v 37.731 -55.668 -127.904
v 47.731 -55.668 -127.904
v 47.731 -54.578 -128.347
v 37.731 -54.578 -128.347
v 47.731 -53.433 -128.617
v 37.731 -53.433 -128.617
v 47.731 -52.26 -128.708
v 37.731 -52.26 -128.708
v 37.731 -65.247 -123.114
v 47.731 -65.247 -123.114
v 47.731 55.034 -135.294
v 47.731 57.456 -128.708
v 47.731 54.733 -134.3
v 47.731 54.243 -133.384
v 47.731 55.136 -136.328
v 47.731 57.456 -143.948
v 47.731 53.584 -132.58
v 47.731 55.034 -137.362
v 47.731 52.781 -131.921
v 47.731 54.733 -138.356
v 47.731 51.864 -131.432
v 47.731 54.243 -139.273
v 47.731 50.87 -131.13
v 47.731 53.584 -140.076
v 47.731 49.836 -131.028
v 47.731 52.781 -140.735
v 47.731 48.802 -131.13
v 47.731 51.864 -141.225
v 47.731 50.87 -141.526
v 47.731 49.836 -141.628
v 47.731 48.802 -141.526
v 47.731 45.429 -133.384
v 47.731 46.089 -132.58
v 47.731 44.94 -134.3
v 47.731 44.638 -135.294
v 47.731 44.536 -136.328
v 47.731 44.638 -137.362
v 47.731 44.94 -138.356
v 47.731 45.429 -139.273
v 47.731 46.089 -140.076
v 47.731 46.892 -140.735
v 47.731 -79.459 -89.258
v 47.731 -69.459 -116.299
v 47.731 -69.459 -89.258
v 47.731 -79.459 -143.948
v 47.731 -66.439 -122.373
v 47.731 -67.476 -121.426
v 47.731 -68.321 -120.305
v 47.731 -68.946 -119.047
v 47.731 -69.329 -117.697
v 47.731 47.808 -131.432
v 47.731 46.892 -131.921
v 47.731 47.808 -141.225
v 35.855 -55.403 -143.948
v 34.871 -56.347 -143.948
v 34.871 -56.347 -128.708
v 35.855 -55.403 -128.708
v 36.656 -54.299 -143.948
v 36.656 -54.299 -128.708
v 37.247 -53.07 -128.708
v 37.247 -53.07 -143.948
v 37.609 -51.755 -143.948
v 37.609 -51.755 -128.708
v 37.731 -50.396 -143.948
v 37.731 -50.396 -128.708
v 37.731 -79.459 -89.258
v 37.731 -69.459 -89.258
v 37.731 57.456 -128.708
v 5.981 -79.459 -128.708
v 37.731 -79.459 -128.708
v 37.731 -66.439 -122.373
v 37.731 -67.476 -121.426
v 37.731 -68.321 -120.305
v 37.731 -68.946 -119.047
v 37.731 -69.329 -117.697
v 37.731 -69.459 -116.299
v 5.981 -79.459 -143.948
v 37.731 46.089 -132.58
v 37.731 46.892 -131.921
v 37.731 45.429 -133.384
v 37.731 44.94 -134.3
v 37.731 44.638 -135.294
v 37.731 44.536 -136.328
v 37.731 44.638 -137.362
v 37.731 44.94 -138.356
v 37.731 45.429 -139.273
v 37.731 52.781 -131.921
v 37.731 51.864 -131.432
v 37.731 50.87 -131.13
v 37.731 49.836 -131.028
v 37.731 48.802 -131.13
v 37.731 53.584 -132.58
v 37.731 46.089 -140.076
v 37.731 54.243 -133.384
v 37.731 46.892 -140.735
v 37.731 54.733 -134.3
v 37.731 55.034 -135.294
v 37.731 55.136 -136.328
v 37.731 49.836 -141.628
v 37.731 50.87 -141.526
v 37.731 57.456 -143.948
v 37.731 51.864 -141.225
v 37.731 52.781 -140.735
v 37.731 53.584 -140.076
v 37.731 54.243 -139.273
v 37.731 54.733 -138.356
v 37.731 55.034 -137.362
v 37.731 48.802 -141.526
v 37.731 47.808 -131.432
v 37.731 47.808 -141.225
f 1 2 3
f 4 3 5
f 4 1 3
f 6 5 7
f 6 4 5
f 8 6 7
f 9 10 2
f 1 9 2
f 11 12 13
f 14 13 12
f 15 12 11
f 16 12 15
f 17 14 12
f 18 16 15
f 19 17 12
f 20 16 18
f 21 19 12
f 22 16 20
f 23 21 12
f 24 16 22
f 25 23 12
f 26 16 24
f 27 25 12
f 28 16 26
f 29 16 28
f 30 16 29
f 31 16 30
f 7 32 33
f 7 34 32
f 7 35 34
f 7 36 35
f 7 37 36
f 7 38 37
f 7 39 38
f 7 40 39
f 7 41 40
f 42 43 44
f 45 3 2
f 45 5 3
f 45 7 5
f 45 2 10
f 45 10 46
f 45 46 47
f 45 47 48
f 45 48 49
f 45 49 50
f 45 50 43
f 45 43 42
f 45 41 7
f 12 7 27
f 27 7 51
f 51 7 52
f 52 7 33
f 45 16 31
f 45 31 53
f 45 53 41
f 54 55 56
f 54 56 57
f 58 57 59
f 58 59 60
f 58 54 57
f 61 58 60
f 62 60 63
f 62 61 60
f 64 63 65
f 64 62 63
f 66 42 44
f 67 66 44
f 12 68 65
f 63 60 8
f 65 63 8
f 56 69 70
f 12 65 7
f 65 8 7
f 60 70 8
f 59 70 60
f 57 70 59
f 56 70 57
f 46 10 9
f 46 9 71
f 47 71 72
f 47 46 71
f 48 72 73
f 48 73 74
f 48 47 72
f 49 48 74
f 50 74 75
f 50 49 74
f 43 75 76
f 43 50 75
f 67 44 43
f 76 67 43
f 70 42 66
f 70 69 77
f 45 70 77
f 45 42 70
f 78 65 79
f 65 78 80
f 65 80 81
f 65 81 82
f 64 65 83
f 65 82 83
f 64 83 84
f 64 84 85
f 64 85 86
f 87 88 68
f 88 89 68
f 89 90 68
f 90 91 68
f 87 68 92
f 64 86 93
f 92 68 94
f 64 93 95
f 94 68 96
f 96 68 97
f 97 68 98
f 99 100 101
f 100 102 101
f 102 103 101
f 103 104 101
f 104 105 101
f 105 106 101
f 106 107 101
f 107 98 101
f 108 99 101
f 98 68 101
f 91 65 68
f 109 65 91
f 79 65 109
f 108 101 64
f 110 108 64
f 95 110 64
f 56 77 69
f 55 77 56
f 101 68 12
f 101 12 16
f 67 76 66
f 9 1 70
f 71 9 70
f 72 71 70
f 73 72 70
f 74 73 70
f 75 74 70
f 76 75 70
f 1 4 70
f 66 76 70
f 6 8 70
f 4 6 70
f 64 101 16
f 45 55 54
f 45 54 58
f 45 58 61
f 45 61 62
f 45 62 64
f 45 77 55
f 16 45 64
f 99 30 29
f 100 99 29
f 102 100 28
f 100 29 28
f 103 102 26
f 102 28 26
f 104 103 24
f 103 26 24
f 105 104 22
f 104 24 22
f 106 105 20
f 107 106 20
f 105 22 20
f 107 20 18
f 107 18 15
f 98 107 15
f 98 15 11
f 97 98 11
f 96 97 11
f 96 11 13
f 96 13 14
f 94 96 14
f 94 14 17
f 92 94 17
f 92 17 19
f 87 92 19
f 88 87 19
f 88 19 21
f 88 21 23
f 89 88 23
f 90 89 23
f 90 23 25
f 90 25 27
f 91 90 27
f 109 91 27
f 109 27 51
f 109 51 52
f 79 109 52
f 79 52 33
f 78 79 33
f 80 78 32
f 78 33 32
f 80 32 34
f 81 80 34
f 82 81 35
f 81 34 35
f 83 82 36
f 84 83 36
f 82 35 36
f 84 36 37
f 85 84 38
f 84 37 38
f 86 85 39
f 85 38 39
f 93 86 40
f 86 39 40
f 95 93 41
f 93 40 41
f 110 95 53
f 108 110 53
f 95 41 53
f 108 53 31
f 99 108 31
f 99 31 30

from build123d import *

# Parameters (mm, degrees)
SKETCH1_W           = 15.24
SKETCH1_H           = 136.915
BOSS_EXTRUDE1_DEPTH = 10
SKETCH2_R           = 5.3
CUT_EXTRUDE1_DEPTH  = 165.72630229
BOSS_EXTRUDE2_DEPTH = 15.24
BOSS_EXTRUDE3_DEPTH = 10
FILLET7_R           = 7.62
FILLET8_R           = 7.62


with BuildPart() as part:
    # Sketch1 → Boss-Extrude1 (new body)
    with BuildSketch(Plane(origin=(37.730745885, 0, 0), x_dir=(0, 0, -1), z_dir=(1, 0, 0))):
        with Locations((136.328078847, -11.001327465)):
            Rectangle(SKETCH1_W, SKETCH1_H)
    extrude(amount=BOSS_EXTRUDE1_DEPTH)

    # Sketch2 → Cut-Extrude1 (cut, through all)
    with BuildSketch(Plane(origin=(47.730745885, 0, 0), x_dir=(0, 0, -1), z_dir=(1, 0, 0))):
        with Locations((136.328078847, 49.836172535)):
            Circle(SKETCH2_R)
    extrude(amount=-CUT_EXTRUDE1_DEPTH, mode=Mode.SUBTRACT)

    # Sketch4 → Boss-Extrude2 (add)
    with BuildSketch(Plane(origin=(0, 0, -143.948078847), x_dir=(-1, 0, 0), z_dir=(0, 0, -1))):
        Polygon((-37.730745885, -79.458827465), (-5.980745885, -79.458827465), (-37.730745885, -54.058827465), align=None)
    extrude(amount=-BOSS_EXTRUDE2_DEPTH)

    # Sketch6 → Boss-Extrude3 (add)
    with BuildSketch(Plane(origin=(47.730745885, 0, 0), x_dir=(0, 0, -1), z_dir=(1, 0, 0))):
        Polygon((128.708078847, -79.458827465), (116.008078847, -79.458827465), (89.258078847, -79.458827465), (89.258078847, -69.458827465), (121.008078847, -69.458827465), (128.708078847, -54.058827465), align=None)
    extrude(amount=-BOSS_EXTRUDE3_DEPTH)

    # Fillet7
    # the kernel refuses this fillet: 7.62 mm, written as the material it adds along each edge
    with BuildSketch(Plane(origin=(37.730745885, -54.058827465, -143.948078847), x_dir=(-0.7808688094430346, -0.6246950475544188, 2.599749935093665e-15), z_dir=(0, 0, 1))) as fillet7_piece_1:
        with BuildLine():
            CenterArc((FILLET7_R * 0.480624847487, -FILLET7_R), FILLET7_R, 90, 51.340191746)
            Line((-FILLET7_R * 0.300243961956, -FILLET7_R * 0.375304952446), (0, 0))
            Line((0, 0), (FILLET7_R * 0.480624847487, 0))
        make_face()
    extrude(amount=15.24)
    with BuildSketch(Plane(origin=(47.730745885, -69.458827465, -121.008078847), x_dir=(-1.4253394908736166e-15, 0.8944271909999135, -0.4472135954999628), z_dir=(-1, 0, 0))) as fillet7_piece_2:
        with BuildLine():
            CenterArc((FILLET7_R * 0.61803398875, -FILLET7_R), FILLET7_R, 90, 63.434948823)
            Line((-FILLET7_R * 0.27639320225, -FILLET7_R * 0.5527864045), (0, 0))
            Line((0, 0), (FILLET7_R * 0.61803398875, 0))
        make_face()
    extrude(amount=10)

    # Fillet8
    fillet8_edges = [part.edges().sort_by_distance(p)[0] for p in [
        (42.730745885, -54.058827465, -128.708078847),
    ]]
    fillet(fillet8_edges, radius=FILLET8_R)


solid = part.part
